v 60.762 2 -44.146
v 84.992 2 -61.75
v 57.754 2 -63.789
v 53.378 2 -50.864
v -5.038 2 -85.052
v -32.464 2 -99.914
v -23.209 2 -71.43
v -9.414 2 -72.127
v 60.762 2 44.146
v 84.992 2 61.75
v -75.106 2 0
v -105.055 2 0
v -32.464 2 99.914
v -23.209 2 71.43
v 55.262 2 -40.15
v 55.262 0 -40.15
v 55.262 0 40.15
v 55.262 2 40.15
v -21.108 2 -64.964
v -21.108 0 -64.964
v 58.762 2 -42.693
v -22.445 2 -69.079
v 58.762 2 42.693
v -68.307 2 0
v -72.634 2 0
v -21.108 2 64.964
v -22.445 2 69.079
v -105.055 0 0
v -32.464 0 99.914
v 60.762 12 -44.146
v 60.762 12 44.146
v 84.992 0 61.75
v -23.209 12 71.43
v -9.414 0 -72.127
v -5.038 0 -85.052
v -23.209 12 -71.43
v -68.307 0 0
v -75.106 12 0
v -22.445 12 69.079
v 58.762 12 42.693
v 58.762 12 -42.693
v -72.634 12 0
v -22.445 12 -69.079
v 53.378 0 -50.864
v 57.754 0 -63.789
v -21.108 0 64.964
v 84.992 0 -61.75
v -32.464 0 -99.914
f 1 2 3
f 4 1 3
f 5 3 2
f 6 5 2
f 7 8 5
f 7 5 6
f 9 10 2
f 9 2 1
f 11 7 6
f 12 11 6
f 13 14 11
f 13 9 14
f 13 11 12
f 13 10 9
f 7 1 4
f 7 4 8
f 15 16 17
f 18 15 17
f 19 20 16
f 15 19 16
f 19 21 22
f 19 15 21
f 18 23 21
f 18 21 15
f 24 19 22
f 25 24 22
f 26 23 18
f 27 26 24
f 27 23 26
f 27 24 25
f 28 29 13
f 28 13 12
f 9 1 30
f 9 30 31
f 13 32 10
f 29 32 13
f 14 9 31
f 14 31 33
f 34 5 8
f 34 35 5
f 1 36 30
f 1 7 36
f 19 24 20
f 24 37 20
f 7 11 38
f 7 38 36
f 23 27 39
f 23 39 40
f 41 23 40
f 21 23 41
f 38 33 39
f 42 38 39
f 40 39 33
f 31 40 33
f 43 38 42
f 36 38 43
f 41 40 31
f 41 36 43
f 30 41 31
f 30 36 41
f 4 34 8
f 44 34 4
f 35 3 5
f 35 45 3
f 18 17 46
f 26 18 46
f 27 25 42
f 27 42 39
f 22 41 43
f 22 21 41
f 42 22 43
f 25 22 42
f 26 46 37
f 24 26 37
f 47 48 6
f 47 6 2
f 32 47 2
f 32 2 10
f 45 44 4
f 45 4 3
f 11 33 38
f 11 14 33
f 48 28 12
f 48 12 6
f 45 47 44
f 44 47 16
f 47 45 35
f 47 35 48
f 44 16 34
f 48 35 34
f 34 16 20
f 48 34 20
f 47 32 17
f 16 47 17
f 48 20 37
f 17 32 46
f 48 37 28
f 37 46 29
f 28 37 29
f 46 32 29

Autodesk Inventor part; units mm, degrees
ref_plane "YZ Plane" through (0, 0, 0) normal (1, 0, 0) x (0, 1, 0)
ref_plane "XZ Plane" through (0, 0, 0) normal (0, 1, 0) x (-1, 0, 0)
ref_plane "XY Plane" through (0, 0, 0) normal (0, 0, 1) x (1, 0, 0)
sketch "草图1" plane through (0, 0, 0) normal (0, 1, 0) x (-1, 0, 0)
  line L0 (68.3073, 0) -> (21.1081, -64.9641)
  line L1 (21.1081, -64.9641) -> (-55.2617, -40.15)
  line L2 (-55.2617, -40.15) -> (-55.2617, 40.15)
  line L3 (-55.2617, 40.15) -> (21.1081, 64.9641)
  line L4 (21.1081, 64.9641) -> (68.3073, 0)
  line L5 (105.0554, 0) -> (32.4639, -99.9136)
  line L6 (32.4639, -99.9136) -> (-84.9916, -61.75)
  line L7 (-84.9916, -61.75) -> (-84.9916, 61.75)
  line L8 (-84.9916, 61.75) -> (32.4639, 99.9136)
  line L9 (32.4639, 99.9136) -> (105.0554, 0)
  point P0 (0, 0)
  point P1 (0, 0)
  point P2 (0, 0)
  dimension "d0" = 80.3
  dimension "d1" = 123.5
extrude "拉伸1" add sketch "草图1" along normal blind 2
sketch "草图2" plane through (0, 2, 0) normal (0, 1, 0) x (1, 0, 0)
  line L0 (-21.1081, 64.9641) -> (55.2617, 40.15) projected
  line L1 (55.2617, 40.15) -> (55.2617, -40.15) projected
  line L2 (55.2617, -40.15) -> (-21.1081, -64.9641) projected
  line L3 (-21.1081, -64.9641) -> (-68.3073, 0) projected
  line L4 (-68.3073, 0) -> (-21.1081, 64.9641) projected
  line L5 (-32.4639, 99.9136) -> (-105.0554, 0) projected
  line L6 (-105.0554, 0) -> (-32.4639, -99.9136) projected
  line L7 (-32.4639, -99.9136) -> (84.9916, -61.75) projected
  line L8 (84.9916, -61.75) -> (84.9916, 61.75) projected
  line L9 (84.9916, 61.75) -> (-32.4639, 99.9136) projected
  line L10 (58.7617, 42.6929) -> (-22.445, 69.0786)
  line L11 (-22.445, 69.0786) -> (-72.6335, 0)
  line L12 (-72.6335, 0) -> (-22.445, -69.0786)
  line L13 (-22.445, -69.0786) -> (58.7617, -42.6929)
  line L14 (58.7617, -42.6929) -> (58.7617, 42.6929)
  line L15 (-23.2089, 71.4297) -> (60.7617, 44.146)
  line L16 (60.7617, 44.146) -> (60.7617, -44.146)
  line L17 (60.7617, -44.146) -> (-23.2089, -71.4297)
  line L18 (-23.2089, -71.4297) -> (-75.1056, 0)
  line L19 (-75.1056, 0) -> (-23.2089, 71.4297)
  point P0 (0, 0)
  dimension "d4" = 3.5
  dimension "d5" = 2
extrude "拉伸2" add sketch "草图2" along normal blind 10 contours L15 L16 L17 L18 L19
sketch "草图3" plane through (0, 0, 0) normal (0, -1, 0) x (1, 0, 0)
  line L0 (-9.4145, -72.1274) -> (53.3776, -50.8644)
  line L1 (53.3776, -50.8644) -> (57.7542, -63.7889)
  line L2 (57.7542, -63.7889) -> (-5.038, -85.0518)
  line L3 (-5.038, -85.0518) -> (-9.4145, -72.1274)
  point P0 (0, 0)
extrude "拉伸3" cut sketch "草图3" against normal blind 10
properties part number "上部端盖" material "ABS 塑料"
